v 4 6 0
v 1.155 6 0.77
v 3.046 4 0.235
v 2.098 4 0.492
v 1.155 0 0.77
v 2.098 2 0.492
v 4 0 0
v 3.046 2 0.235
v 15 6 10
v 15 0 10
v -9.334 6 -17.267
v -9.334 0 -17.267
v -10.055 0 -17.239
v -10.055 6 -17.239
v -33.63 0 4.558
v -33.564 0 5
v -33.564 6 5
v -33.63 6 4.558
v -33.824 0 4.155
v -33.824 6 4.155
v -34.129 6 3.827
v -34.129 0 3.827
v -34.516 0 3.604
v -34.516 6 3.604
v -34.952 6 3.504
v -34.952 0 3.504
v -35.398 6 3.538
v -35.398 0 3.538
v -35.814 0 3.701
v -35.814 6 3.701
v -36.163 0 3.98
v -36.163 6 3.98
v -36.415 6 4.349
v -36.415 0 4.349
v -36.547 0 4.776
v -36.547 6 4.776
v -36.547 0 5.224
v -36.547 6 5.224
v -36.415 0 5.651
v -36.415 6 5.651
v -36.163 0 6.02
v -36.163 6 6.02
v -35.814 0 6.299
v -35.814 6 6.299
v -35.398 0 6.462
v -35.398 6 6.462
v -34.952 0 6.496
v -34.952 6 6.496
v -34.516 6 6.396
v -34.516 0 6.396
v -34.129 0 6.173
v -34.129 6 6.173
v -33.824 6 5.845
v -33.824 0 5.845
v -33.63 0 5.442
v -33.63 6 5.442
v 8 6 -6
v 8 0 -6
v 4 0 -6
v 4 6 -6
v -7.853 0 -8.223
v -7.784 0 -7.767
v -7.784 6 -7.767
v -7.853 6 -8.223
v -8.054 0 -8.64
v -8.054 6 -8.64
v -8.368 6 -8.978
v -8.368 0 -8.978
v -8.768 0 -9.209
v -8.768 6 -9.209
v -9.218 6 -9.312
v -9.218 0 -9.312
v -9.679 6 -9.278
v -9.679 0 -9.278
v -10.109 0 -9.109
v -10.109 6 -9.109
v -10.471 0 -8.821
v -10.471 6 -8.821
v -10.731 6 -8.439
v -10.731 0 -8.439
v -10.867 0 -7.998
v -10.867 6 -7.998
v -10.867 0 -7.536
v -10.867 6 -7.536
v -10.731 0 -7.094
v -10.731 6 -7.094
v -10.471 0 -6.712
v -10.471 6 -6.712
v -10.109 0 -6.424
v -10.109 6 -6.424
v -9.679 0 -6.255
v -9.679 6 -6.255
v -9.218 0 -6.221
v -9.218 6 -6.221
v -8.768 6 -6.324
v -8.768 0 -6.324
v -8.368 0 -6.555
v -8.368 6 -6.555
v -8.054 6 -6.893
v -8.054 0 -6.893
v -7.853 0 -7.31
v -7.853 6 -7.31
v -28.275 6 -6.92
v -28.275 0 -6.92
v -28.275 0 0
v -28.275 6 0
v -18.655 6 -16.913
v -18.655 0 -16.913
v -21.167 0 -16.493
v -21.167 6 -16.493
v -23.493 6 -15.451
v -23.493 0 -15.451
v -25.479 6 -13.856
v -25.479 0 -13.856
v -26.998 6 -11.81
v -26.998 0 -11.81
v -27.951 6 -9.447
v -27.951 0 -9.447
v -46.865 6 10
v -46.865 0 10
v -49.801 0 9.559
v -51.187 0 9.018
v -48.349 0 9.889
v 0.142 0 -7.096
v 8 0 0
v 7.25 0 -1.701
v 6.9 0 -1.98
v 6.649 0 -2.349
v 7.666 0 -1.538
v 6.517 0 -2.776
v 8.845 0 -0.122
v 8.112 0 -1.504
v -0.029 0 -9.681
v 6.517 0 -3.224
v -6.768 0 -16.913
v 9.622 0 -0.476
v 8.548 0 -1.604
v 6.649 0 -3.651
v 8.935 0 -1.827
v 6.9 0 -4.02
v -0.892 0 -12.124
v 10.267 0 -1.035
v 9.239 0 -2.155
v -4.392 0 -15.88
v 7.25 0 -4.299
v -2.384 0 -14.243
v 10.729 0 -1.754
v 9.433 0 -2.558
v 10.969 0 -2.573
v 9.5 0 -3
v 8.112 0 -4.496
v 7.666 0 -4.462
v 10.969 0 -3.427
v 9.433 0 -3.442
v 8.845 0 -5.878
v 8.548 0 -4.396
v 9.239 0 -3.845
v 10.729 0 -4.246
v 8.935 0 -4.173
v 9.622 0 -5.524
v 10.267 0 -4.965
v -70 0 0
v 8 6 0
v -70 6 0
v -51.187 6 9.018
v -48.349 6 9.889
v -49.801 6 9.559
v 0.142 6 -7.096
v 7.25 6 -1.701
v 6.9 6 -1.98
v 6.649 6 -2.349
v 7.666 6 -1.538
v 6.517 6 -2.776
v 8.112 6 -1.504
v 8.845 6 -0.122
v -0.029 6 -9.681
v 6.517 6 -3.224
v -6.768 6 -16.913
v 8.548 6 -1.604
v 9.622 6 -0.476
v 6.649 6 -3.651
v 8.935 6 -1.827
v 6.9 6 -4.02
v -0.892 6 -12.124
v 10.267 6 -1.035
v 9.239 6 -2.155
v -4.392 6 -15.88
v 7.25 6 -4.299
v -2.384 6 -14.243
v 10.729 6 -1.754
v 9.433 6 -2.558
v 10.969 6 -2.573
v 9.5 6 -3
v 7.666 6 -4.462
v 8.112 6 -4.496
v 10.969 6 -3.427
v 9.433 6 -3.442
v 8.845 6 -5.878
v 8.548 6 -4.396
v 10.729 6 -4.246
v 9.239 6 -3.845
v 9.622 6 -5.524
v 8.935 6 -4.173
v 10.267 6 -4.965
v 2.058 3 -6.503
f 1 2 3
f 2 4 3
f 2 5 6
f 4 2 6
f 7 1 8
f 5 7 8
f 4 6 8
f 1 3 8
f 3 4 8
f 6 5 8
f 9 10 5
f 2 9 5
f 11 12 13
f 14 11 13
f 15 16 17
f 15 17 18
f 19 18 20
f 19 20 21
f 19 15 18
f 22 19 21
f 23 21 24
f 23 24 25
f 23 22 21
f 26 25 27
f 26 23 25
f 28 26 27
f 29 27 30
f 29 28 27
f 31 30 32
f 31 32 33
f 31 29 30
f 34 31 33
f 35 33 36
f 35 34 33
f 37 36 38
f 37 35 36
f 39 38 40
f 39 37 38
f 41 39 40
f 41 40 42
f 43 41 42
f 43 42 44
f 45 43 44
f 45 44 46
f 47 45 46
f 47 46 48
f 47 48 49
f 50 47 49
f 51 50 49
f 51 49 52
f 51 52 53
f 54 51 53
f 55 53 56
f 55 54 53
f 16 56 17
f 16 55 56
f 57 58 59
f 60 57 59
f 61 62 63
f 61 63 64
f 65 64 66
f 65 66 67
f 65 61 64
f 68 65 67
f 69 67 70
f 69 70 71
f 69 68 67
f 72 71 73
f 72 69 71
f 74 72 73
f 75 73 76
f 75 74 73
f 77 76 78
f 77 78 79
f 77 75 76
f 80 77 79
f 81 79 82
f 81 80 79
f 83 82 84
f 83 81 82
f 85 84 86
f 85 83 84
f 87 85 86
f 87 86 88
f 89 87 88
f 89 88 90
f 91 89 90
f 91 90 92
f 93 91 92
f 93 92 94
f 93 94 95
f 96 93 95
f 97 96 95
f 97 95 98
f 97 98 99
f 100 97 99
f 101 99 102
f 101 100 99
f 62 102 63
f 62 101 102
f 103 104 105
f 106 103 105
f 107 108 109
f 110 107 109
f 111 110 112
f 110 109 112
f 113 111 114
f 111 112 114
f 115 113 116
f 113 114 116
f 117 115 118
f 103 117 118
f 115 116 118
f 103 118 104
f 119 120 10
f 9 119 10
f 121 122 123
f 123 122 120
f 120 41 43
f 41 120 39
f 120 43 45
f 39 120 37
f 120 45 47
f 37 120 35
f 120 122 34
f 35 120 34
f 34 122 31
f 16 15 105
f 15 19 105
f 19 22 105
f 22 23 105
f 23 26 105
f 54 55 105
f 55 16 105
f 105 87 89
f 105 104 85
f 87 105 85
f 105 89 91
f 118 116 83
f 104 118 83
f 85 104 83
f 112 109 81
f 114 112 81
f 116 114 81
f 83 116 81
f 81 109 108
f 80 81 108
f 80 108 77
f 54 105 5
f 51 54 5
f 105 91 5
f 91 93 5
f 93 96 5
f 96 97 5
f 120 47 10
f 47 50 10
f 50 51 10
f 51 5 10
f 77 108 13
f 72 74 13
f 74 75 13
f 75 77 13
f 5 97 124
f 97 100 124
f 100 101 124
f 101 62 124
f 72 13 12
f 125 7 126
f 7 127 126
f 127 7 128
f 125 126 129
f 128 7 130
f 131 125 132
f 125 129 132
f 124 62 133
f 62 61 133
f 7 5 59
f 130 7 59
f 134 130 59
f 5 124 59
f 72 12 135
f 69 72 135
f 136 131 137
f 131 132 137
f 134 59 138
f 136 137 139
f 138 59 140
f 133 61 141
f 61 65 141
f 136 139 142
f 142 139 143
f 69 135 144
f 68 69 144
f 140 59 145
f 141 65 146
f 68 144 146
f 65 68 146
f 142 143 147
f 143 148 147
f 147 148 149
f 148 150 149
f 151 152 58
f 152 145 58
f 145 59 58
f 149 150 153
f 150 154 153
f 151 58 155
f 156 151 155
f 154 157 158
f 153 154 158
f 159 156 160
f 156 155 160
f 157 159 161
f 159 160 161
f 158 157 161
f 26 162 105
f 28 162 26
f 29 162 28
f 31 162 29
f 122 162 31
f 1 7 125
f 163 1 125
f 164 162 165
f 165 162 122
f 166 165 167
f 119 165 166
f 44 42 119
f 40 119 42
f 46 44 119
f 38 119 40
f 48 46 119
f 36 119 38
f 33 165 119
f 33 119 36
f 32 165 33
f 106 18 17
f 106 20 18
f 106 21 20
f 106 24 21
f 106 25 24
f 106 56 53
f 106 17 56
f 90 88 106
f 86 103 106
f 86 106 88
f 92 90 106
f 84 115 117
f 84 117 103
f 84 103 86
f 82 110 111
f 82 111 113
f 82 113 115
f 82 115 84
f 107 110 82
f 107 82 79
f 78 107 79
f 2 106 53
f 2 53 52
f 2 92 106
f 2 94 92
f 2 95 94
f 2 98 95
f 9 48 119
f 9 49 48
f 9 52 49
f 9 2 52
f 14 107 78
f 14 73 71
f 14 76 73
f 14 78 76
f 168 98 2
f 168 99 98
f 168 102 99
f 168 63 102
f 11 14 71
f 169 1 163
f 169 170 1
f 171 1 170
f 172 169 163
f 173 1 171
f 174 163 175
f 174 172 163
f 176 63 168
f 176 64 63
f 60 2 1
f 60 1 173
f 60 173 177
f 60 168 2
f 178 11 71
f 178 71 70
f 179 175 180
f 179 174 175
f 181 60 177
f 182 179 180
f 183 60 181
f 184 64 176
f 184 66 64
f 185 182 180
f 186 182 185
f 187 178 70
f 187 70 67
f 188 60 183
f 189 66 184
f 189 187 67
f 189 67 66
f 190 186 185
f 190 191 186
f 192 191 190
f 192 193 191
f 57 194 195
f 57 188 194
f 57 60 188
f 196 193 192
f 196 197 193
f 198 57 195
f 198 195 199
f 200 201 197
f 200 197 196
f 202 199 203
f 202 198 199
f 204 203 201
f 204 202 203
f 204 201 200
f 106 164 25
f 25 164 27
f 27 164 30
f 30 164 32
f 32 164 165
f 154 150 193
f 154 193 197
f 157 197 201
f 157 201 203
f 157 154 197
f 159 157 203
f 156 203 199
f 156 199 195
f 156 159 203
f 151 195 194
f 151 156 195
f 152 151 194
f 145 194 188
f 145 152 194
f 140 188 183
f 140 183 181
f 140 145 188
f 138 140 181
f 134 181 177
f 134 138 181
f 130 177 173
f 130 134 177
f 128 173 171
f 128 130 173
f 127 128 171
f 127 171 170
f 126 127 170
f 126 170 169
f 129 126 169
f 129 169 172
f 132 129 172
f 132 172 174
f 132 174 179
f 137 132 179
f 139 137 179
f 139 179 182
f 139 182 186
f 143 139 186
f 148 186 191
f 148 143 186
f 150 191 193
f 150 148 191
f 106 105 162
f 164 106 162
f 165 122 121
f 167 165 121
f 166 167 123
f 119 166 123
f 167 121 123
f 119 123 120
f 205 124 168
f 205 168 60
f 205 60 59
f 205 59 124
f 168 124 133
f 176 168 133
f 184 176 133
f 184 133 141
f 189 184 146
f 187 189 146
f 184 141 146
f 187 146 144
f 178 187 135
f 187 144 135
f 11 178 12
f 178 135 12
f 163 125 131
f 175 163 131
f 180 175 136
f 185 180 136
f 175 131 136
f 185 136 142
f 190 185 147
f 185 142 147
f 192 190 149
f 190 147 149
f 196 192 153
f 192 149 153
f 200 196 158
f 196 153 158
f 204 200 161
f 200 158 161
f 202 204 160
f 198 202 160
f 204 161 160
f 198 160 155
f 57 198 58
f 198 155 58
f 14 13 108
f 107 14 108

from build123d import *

# Parameters (mm, degrees)
SKETCH1_R           = 1.5
SKETCH1_R_2         = 1.55
BOSS_EXTRUDE1_DEPTH = 6


with BuildPart() as part:
    # Sketch1 → Boss-Extrude1 (new body)
    with BuildSketch(Plane(origin=(0, 0, 0), x_dir=(1, 0, 0), z_dir=(0, 1, 0))):
        with BuildLine():
            Line((-10.054576391, 17.239228809), (-18.654572416, 16.912740777))
            ThreePointArc((-18.654572416, 16.912740777), (-25.479153077, 13.855584783), (-28.275208275, 6.919939226))
            Line((-28.275208275, 6.919939226), (-28.275208275, 0))
            Line((-28.275208275, 0), (-49.137604137, 0))
            Line((-49.137604137, 0), (-70, 0))
            Line((-70, 0), (-51.187164382, -9.017581558))
            ThreePointArc((-51.187164382, -9.017581558), (-49.081079033, -9.751302876), (-46.864755002, -10))
            Line((-46.864755002, -10), (0, -10))
            Line((0, -10), (15, -10))
            Line((15, -10), (1.155446716, -0.770297811))
            add(Edge.make_bspline(
                [(1.155446716, -0.770297811), (2.094509546, -0.481388498), (3.042693974, -0.224622561), (4, 0)],
                knots=[0.265250857, 0.265250857, 0.265250857, 0.265250857, 1, 1, 1, 1], degree=3))
            Line((4, 0), (8, 0))
            ThreePointArc((8, 0), (11, 3), (8, 6))
            Line((8, 6), (4, 6))
            add(Edge.make_bspline(
                [(0.141983447, 7.095761644), (2.045647207, 6.458569901), (4, 6)],
                knots=[0, 0, 0, 1, 1, 1], degree=2))
            ThreePointArc((0.141983447, 7.095761644), (-2.383666412, 14.242578452), (-9.33430338, 17.266573068))
            Line((-9.33430338, 17.266573068), (-10.054576391, 17.239228809))
        make_face()
        with Locations((-35.063841459, -5)):
            Circle(SKETCH1_R, mode=Mode.SUBTRACT)
        with Locations((8, 3)):
            Circle(SKETCH1_R, mode=Mode.SUBTRACT)
        with Locations((-9.33430338, 7.766573068)):
            Circle(SKETCH1_R_2, mode=Mode.SUBTRACT)
    extrude(amount=BOSS_EXTRUDE1_DEPTH)


solid = part.part
